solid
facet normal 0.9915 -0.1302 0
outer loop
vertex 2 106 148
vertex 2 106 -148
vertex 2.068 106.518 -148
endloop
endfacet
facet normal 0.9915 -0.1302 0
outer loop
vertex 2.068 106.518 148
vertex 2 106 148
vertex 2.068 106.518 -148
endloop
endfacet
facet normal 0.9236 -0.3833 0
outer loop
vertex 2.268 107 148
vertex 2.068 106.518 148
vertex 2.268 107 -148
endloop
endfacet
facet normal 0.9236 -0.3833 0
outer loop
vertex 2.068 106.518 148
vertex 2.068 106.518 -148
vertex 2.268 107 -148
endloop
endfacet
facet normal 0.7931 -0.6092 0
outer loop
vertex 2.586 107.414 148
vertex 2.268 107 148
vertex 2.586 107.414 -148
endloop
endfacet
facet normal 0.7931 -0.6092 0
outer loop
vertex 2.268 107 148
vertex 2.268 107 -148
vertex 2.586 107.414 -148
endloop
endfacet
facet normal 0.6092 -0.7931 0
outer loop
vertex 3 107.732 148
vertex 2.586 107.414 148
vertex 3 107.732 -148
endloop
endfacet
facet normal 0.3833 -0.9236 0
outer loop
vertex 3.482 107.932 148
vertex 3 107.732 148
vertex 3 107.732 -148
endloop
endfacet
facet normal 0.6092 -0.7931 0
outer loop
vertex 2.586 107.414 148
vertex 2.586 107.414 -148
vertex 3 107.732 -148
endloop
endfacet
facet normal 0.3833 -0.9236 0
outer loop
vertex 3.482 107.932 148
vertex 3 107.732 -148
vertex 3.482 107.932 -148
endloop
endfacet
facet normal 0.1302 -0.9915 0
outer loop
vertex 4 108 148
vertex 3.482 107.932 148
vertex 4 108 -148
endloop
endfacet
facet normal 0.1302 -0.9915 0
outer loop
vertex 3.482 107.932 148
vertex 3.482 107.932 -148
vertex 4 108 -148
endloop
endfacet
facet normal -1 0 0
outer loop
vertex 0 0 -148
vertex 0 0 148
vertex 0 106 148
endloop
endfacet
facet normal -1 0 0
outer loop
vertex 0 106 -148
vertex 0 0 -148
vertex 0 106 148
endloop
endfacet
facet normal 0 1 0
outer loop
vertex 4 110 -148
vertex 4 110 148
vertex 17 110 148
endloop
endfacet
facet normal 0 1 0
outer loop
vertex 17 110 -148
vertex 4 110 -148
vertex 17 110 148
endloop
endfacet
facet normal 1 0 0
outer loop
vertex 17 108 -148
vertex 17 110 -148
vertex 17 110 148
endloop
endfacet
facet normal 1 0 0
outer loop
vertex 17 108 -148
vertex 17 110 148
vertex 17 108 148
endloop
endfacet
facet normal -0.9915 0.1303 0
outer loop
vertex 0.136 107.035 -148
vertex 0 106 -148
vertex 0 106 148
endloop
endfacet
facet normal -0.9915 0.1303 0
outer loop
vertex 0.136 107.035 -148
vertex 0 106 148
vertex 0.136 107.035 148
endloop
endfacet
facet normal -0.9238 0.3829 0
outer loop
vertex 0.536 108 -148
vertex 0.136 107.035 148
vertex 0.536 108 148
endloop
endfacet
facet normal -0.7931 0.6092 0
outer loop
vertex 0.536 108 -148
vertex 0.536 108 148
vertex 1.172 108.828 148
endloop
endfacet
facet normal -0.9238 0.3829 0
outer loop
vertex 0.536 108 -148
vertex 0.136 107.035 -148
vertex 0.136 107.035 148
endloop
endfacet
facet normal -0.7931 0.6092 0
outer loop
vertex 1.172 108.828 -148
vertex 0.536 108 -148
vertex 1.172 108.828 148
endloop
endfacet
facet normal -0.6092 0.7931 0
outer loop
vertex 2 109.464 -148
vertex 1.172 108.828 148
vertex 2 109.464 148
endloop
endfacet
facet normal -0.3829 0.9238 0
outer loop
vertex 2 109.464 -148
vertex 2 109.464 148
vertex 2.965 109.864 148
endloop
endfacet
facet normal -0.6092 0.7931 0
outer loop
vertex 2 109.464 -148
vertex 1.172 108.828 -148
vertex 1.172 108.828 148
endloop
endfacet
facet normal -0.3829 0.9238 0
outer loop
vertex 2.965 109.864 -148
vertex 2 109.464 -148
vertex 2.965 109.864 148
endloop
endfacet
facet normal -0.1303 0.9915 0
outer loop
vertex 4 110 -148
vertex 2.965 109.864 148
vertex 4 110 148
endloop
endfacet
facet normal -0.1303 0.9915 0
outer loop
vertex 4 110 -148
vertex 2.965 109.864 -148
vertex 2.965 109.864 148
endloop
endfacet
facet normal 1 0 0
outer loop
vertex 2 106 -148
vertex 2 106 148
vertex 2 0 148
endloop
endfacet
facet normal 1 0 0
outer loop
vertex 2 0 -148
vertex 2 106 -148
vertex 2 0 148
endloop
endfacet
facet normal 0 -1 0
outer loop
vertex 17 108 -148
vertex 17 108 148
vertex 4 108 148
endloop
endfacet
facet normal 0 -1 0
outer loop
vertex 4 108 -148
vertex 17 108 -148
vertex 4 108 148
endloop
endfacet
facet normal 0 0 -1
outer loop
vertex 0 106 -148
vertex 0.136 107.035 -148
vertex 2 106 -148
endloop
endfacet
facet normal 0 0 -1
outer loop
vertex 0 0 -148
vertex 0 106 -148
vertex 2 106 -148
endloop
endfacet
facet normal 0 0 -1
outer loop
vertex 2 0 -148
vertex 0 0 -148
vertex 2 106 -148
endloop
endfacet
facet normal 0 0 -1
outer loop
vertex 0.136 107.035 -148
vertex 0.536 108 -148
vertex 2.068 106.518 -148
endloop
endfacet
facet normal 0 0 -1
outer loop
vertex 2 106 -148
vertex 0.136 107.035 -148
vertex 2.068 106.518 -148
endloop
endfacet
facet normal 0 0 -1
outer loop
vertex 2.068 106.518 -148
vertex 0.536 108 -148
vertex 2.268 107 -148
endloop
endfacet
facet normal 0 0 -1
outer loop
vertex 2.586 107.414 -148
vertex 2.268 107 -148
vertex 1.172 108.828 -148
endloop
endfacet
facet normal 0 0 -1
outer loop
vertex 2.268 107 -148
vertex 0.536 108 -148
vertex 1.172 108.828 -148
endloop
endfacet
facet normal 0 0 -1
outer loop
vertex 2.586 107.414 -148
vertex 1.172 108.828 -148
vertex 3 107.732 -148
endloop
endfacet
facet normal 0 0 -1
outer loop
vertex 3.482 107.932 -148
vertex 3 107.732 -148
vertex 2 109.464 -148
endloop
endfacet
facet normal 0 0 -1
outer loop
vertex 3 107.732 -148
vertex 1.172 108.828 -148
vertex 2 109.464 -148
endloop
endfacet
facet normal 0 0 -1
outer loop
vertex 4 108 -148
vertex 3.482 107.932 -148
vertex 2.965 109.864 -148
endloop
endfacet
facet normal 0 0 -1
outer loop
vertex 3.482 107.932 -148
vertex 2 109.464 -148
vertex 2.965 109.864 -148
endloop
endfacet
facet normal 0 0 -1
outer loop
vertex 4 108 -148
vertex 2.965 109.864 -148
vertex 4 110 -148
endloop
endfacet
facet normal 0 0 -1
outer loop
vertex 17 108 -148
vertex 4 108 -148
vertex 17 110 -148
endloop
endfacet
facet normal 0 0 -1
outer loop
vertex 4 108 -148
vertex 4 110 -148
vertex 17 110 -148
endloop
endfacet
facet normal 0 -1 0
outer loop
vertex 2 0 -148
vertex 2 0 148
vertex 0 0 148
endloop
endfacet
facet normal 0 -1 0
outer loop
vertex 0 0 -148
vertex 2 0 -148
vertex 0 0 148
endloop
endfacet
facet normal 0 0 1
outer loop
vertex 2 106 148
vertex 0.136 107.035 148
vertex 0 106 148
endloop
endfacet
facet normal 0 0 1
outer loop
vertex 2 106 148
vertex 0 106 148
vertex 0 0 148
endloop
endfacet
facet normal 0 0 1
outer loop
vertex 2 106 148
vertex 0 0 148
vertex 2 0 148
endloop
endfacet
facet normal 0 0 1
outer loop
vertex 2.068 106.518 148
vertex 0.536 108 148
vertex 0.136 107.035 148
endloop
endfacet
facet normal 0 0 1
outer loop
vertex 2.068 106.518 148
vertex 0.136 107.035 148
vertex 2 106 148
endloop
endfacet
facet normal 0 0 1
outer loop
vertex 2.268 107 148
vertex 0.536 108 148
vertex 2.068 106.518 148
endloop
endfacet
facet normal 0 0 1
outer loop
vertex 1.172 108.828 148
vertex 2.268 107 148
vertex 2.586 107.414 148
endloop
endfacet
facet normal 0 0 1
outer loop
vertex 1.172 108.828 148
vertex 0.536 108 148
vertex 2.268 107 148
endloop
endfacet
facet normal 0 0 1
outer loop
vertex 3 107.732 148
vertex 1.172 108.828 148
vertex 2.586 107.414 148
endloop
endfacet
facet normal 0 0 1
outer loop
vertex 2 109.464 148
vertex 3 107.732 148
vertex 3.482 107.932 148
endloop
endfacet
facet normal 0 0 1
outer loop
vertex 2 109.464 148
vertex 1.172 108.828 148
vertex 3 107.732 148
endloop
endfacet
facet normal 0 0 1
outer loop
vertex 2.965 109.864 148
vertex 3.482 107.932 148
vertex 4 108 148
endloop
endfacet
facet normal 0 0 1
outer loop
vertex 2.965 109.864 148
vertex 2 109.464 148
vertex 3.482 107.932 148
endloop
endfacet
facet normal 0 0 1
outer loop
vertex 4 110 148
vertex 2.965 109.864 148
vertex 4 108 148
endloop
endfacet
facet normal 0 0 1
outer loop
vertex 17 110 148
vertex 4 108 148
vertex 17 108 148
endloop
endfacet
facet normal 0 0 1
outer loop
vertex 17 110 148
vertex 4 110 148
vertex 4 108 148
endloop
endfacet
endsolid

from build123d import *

# Parameters (mm, degrees)
BOSS_EXTRUDE1_DEPTH    = 148
CONVERT_SOLID1_START   = -148
CONVERT_SOLID1_DEPTH   = 296
CONVERT_SOLID1_2_DEPTH = 296


# Read off the part's stored shape, not the designer's step: Convert-Solid1
with BuildPart() as part:
    # Sketch1 → Boss-Extrude1 (new, symmetric)
    with BuildSketch(Plane.XY):
        Polygon((0, 0), (0, 110), (17, 110), (17, 108), (2, 108), (2, 0), align=None)
    extrude(amount=BOSS_EXTRUDE1_DEPTH, both=True)

    # Convert-Solid1 outline → Convert-Solid1 (cut)
    with BuildSketch(Plane.XY.offset(CONVERT_SOLID1_START)):
        with BuildLine():
            ThreePointArc((0, 106), (1.171572875, 108.828427125), (4, 110))
            Line((4, 110), (0, 110))
            Line((0, 110), (0, 106))
        make_face()
    extrude(amount=CONVERT_SOLID1_DEPTH, mode=Mode.SUBTRACT)

    # Convert-Solid1 2 outline → Convert-Solid1 2 (add)
    with BuildSketch(Plane.XY.offset(CONVERT_SOLID1_START)):
        with BuildLine():
            ThreePointArc((2, 106), (2.585786438, 107.414213562), (4, 108))
            Line((4, 108), (2, 108))
            Line((2, 108), (2, 106))
        make_face()
    extrude(amount=CONVERT_SOLID1_2_DEPTH)


solid = part.part
